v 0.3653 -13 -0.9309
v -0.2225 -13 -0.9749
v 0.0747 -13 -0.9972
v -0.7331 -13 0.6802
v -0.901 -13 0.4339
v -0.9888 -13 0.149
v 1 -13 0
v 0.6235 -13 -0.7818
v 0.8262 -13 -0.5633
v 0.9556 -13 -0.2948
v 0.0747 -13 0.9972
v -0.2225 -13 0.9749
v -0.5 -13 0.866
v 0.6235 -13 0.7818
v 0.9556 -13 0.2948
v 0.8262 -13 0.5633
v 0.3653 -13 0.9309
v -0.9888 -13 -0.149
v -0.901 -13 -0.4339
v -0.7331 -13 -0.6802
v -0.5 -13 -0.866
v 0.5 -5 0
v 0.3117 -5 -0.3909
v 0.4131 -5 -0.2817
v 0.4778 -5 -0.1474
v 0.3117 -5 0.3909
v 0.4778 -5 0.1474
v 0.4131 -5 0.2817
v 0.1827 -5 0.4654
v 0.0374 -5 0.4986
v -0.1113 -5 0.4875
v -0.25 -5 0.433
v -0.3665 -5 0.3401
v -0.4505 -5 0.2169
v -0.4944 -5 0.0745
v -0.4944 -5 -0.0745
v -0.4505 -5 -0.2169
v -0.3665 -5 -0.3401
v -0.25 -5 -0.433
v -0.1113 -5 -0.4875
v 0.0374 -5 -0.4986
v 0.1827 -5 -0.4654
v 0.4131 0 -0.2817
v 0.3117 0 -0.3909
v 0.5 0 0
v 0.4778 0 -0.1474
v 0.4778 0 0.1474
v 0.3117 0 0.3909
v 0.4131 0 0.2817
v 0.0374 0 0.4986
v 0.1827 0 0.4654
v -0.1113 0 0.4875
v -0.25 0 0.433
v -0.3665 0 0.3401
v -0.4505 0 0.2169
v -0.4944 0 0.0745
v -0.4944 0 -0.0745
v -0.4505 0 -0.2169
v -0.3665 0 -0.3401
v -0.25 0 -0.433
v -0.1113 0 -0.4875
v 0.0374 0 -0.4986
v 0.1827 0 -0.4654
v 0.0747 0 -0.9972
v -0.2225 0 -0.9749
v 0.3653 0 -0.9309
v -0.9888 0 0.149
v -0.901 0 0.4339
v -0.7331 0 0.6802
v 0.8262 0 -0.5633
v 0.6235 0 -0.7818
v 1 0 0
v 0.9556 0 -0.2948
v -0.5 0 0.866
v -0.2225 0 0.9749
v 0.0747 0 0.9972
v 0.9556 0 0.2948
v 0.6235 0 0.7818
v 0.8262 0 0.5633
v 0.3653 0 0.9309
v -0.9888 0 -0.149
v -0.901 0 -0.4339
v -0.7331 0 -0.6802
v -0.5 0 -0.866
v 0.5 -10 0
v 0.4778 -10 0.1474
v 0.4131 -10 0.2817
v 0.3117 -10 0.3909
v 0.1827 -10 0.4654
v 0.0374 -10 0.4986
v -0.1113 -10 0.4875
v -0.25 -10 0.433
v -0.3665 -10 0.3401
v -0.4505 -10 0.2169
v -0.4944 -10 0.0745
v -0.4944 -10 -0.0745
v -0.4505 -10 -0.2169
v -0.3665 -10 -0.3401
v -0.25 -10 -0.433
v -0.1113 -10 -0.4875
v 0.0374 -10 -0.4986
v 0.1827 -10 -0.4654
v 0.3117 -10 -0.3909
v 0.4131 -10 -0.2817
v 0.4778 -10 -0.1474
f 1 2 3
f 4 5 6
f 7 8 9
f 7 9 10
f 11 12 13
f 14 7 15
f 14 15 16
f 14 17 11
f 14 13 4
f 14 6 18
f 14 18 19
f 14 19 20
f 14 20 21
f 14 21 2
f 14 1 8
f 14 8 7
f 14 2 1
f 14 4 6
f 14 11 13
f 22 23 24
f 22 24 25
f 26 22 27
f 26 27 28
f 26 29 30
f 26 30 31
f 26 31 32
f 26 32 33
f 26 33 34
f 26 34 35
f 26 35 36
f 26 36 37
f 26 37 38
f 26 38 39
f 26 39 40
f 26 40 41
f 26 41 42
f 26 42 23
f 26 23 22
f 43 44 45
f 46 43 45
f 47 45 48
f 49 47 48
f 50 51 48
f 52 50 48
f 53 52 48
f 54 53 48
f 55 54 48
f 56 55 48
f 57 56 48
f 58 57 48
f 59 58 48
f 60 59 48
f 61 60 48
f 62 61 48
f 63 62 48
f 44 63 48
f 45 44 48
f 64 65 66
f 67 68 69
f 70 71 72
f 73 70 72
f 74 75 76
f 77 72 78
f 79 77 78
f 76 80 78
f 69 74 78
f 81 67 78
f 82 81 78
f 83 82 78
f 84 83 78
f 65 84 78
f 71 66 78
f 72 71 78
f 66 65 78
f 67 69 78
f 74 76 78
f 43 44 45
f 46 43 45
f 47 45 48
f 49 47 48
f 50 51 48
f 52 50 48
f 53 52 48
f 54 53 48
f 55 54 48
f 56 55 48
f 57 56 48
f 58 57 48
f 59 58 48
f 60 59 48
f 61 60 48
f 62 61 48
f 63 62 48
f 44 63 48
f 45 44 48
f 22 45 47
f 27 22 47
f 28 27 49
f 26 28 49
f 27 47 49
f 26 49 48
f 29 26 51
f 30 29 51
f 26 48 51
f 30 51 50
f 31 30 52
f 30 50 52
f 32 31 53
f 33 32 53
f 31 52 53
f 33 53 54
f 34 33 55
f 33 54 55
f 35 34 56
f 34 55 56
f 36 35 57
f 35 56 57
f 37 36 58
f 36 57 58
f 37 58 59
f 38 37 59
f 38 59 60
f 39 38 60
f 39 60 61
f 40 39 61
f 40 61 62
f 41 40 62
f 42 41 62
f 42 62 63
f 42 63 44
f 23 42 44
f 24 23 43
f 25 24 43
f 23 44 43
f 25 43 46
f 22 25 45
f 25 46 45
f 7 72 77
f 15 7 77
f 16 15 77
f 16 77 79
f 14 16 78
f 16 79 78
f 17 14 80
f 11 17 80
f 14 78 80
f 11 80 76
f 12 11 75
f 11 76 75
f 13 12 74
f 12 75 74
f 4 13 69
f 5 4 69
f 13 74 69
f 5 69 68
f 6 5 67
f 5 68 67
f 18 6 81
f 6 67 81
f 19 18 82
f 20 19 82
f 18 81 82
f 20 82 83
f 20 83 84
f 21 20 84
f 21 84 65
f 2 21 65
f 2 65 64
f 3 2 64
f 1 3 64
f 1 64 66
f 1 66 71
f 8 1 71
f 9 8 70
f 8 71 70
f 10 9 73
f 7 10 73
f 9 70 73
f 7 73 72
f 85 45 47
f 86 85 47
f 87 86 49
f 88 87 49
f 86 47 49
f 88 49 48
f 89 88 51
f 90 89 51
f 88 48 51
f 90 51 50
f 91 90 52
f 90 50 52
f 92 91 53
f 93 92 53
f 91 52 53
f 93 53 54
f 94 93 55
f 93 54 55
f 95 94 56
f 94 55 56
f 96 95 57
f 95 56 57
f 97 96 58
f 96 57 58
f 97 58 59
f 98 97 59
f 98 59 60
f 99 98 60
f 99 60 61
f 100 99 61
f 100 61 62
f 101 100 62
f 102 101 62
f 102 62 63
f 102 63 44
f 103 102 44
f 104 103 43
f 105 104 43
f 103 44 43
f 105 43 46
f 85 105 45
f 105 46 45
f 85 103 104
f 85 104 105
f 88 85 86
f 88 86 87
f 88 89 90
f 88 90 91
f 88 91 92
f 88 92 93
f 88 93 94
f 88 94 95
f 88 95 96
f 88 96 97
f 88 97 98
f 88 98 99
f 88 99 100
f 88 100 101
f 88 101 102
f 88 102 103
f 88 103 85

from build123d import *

# Parameters (mm, degrees)
F0_R     = 1
F1_DEPTH = 13
F2_R     = 0.5
F3_DEPTH = 5
F4_DEPTH = 10


with BuildPart() as f1:
    # F0 (on Front) → F1 (new body)
    with BuildSketch(Plane.XZ):
        Circle(F0_R)
    extrude(amount=F1_DEPTH)


with BuildPart() as f3:
    # F2 (on Front) → F3 (new body)
    with BuildSketch(Plane.XZ):
        Circle(F2_R)
    extrude(amount=F3_DEPTH)


with BuildPart() as f4:
    # F2 (on Front) → F4 (new body)
    with BuildSketch(Plane.XZ):
        Circle(F2_R)
    extrude(amount=F4_DEPTH)


solid = Compound([f1.part, f3.part, f4.part])
